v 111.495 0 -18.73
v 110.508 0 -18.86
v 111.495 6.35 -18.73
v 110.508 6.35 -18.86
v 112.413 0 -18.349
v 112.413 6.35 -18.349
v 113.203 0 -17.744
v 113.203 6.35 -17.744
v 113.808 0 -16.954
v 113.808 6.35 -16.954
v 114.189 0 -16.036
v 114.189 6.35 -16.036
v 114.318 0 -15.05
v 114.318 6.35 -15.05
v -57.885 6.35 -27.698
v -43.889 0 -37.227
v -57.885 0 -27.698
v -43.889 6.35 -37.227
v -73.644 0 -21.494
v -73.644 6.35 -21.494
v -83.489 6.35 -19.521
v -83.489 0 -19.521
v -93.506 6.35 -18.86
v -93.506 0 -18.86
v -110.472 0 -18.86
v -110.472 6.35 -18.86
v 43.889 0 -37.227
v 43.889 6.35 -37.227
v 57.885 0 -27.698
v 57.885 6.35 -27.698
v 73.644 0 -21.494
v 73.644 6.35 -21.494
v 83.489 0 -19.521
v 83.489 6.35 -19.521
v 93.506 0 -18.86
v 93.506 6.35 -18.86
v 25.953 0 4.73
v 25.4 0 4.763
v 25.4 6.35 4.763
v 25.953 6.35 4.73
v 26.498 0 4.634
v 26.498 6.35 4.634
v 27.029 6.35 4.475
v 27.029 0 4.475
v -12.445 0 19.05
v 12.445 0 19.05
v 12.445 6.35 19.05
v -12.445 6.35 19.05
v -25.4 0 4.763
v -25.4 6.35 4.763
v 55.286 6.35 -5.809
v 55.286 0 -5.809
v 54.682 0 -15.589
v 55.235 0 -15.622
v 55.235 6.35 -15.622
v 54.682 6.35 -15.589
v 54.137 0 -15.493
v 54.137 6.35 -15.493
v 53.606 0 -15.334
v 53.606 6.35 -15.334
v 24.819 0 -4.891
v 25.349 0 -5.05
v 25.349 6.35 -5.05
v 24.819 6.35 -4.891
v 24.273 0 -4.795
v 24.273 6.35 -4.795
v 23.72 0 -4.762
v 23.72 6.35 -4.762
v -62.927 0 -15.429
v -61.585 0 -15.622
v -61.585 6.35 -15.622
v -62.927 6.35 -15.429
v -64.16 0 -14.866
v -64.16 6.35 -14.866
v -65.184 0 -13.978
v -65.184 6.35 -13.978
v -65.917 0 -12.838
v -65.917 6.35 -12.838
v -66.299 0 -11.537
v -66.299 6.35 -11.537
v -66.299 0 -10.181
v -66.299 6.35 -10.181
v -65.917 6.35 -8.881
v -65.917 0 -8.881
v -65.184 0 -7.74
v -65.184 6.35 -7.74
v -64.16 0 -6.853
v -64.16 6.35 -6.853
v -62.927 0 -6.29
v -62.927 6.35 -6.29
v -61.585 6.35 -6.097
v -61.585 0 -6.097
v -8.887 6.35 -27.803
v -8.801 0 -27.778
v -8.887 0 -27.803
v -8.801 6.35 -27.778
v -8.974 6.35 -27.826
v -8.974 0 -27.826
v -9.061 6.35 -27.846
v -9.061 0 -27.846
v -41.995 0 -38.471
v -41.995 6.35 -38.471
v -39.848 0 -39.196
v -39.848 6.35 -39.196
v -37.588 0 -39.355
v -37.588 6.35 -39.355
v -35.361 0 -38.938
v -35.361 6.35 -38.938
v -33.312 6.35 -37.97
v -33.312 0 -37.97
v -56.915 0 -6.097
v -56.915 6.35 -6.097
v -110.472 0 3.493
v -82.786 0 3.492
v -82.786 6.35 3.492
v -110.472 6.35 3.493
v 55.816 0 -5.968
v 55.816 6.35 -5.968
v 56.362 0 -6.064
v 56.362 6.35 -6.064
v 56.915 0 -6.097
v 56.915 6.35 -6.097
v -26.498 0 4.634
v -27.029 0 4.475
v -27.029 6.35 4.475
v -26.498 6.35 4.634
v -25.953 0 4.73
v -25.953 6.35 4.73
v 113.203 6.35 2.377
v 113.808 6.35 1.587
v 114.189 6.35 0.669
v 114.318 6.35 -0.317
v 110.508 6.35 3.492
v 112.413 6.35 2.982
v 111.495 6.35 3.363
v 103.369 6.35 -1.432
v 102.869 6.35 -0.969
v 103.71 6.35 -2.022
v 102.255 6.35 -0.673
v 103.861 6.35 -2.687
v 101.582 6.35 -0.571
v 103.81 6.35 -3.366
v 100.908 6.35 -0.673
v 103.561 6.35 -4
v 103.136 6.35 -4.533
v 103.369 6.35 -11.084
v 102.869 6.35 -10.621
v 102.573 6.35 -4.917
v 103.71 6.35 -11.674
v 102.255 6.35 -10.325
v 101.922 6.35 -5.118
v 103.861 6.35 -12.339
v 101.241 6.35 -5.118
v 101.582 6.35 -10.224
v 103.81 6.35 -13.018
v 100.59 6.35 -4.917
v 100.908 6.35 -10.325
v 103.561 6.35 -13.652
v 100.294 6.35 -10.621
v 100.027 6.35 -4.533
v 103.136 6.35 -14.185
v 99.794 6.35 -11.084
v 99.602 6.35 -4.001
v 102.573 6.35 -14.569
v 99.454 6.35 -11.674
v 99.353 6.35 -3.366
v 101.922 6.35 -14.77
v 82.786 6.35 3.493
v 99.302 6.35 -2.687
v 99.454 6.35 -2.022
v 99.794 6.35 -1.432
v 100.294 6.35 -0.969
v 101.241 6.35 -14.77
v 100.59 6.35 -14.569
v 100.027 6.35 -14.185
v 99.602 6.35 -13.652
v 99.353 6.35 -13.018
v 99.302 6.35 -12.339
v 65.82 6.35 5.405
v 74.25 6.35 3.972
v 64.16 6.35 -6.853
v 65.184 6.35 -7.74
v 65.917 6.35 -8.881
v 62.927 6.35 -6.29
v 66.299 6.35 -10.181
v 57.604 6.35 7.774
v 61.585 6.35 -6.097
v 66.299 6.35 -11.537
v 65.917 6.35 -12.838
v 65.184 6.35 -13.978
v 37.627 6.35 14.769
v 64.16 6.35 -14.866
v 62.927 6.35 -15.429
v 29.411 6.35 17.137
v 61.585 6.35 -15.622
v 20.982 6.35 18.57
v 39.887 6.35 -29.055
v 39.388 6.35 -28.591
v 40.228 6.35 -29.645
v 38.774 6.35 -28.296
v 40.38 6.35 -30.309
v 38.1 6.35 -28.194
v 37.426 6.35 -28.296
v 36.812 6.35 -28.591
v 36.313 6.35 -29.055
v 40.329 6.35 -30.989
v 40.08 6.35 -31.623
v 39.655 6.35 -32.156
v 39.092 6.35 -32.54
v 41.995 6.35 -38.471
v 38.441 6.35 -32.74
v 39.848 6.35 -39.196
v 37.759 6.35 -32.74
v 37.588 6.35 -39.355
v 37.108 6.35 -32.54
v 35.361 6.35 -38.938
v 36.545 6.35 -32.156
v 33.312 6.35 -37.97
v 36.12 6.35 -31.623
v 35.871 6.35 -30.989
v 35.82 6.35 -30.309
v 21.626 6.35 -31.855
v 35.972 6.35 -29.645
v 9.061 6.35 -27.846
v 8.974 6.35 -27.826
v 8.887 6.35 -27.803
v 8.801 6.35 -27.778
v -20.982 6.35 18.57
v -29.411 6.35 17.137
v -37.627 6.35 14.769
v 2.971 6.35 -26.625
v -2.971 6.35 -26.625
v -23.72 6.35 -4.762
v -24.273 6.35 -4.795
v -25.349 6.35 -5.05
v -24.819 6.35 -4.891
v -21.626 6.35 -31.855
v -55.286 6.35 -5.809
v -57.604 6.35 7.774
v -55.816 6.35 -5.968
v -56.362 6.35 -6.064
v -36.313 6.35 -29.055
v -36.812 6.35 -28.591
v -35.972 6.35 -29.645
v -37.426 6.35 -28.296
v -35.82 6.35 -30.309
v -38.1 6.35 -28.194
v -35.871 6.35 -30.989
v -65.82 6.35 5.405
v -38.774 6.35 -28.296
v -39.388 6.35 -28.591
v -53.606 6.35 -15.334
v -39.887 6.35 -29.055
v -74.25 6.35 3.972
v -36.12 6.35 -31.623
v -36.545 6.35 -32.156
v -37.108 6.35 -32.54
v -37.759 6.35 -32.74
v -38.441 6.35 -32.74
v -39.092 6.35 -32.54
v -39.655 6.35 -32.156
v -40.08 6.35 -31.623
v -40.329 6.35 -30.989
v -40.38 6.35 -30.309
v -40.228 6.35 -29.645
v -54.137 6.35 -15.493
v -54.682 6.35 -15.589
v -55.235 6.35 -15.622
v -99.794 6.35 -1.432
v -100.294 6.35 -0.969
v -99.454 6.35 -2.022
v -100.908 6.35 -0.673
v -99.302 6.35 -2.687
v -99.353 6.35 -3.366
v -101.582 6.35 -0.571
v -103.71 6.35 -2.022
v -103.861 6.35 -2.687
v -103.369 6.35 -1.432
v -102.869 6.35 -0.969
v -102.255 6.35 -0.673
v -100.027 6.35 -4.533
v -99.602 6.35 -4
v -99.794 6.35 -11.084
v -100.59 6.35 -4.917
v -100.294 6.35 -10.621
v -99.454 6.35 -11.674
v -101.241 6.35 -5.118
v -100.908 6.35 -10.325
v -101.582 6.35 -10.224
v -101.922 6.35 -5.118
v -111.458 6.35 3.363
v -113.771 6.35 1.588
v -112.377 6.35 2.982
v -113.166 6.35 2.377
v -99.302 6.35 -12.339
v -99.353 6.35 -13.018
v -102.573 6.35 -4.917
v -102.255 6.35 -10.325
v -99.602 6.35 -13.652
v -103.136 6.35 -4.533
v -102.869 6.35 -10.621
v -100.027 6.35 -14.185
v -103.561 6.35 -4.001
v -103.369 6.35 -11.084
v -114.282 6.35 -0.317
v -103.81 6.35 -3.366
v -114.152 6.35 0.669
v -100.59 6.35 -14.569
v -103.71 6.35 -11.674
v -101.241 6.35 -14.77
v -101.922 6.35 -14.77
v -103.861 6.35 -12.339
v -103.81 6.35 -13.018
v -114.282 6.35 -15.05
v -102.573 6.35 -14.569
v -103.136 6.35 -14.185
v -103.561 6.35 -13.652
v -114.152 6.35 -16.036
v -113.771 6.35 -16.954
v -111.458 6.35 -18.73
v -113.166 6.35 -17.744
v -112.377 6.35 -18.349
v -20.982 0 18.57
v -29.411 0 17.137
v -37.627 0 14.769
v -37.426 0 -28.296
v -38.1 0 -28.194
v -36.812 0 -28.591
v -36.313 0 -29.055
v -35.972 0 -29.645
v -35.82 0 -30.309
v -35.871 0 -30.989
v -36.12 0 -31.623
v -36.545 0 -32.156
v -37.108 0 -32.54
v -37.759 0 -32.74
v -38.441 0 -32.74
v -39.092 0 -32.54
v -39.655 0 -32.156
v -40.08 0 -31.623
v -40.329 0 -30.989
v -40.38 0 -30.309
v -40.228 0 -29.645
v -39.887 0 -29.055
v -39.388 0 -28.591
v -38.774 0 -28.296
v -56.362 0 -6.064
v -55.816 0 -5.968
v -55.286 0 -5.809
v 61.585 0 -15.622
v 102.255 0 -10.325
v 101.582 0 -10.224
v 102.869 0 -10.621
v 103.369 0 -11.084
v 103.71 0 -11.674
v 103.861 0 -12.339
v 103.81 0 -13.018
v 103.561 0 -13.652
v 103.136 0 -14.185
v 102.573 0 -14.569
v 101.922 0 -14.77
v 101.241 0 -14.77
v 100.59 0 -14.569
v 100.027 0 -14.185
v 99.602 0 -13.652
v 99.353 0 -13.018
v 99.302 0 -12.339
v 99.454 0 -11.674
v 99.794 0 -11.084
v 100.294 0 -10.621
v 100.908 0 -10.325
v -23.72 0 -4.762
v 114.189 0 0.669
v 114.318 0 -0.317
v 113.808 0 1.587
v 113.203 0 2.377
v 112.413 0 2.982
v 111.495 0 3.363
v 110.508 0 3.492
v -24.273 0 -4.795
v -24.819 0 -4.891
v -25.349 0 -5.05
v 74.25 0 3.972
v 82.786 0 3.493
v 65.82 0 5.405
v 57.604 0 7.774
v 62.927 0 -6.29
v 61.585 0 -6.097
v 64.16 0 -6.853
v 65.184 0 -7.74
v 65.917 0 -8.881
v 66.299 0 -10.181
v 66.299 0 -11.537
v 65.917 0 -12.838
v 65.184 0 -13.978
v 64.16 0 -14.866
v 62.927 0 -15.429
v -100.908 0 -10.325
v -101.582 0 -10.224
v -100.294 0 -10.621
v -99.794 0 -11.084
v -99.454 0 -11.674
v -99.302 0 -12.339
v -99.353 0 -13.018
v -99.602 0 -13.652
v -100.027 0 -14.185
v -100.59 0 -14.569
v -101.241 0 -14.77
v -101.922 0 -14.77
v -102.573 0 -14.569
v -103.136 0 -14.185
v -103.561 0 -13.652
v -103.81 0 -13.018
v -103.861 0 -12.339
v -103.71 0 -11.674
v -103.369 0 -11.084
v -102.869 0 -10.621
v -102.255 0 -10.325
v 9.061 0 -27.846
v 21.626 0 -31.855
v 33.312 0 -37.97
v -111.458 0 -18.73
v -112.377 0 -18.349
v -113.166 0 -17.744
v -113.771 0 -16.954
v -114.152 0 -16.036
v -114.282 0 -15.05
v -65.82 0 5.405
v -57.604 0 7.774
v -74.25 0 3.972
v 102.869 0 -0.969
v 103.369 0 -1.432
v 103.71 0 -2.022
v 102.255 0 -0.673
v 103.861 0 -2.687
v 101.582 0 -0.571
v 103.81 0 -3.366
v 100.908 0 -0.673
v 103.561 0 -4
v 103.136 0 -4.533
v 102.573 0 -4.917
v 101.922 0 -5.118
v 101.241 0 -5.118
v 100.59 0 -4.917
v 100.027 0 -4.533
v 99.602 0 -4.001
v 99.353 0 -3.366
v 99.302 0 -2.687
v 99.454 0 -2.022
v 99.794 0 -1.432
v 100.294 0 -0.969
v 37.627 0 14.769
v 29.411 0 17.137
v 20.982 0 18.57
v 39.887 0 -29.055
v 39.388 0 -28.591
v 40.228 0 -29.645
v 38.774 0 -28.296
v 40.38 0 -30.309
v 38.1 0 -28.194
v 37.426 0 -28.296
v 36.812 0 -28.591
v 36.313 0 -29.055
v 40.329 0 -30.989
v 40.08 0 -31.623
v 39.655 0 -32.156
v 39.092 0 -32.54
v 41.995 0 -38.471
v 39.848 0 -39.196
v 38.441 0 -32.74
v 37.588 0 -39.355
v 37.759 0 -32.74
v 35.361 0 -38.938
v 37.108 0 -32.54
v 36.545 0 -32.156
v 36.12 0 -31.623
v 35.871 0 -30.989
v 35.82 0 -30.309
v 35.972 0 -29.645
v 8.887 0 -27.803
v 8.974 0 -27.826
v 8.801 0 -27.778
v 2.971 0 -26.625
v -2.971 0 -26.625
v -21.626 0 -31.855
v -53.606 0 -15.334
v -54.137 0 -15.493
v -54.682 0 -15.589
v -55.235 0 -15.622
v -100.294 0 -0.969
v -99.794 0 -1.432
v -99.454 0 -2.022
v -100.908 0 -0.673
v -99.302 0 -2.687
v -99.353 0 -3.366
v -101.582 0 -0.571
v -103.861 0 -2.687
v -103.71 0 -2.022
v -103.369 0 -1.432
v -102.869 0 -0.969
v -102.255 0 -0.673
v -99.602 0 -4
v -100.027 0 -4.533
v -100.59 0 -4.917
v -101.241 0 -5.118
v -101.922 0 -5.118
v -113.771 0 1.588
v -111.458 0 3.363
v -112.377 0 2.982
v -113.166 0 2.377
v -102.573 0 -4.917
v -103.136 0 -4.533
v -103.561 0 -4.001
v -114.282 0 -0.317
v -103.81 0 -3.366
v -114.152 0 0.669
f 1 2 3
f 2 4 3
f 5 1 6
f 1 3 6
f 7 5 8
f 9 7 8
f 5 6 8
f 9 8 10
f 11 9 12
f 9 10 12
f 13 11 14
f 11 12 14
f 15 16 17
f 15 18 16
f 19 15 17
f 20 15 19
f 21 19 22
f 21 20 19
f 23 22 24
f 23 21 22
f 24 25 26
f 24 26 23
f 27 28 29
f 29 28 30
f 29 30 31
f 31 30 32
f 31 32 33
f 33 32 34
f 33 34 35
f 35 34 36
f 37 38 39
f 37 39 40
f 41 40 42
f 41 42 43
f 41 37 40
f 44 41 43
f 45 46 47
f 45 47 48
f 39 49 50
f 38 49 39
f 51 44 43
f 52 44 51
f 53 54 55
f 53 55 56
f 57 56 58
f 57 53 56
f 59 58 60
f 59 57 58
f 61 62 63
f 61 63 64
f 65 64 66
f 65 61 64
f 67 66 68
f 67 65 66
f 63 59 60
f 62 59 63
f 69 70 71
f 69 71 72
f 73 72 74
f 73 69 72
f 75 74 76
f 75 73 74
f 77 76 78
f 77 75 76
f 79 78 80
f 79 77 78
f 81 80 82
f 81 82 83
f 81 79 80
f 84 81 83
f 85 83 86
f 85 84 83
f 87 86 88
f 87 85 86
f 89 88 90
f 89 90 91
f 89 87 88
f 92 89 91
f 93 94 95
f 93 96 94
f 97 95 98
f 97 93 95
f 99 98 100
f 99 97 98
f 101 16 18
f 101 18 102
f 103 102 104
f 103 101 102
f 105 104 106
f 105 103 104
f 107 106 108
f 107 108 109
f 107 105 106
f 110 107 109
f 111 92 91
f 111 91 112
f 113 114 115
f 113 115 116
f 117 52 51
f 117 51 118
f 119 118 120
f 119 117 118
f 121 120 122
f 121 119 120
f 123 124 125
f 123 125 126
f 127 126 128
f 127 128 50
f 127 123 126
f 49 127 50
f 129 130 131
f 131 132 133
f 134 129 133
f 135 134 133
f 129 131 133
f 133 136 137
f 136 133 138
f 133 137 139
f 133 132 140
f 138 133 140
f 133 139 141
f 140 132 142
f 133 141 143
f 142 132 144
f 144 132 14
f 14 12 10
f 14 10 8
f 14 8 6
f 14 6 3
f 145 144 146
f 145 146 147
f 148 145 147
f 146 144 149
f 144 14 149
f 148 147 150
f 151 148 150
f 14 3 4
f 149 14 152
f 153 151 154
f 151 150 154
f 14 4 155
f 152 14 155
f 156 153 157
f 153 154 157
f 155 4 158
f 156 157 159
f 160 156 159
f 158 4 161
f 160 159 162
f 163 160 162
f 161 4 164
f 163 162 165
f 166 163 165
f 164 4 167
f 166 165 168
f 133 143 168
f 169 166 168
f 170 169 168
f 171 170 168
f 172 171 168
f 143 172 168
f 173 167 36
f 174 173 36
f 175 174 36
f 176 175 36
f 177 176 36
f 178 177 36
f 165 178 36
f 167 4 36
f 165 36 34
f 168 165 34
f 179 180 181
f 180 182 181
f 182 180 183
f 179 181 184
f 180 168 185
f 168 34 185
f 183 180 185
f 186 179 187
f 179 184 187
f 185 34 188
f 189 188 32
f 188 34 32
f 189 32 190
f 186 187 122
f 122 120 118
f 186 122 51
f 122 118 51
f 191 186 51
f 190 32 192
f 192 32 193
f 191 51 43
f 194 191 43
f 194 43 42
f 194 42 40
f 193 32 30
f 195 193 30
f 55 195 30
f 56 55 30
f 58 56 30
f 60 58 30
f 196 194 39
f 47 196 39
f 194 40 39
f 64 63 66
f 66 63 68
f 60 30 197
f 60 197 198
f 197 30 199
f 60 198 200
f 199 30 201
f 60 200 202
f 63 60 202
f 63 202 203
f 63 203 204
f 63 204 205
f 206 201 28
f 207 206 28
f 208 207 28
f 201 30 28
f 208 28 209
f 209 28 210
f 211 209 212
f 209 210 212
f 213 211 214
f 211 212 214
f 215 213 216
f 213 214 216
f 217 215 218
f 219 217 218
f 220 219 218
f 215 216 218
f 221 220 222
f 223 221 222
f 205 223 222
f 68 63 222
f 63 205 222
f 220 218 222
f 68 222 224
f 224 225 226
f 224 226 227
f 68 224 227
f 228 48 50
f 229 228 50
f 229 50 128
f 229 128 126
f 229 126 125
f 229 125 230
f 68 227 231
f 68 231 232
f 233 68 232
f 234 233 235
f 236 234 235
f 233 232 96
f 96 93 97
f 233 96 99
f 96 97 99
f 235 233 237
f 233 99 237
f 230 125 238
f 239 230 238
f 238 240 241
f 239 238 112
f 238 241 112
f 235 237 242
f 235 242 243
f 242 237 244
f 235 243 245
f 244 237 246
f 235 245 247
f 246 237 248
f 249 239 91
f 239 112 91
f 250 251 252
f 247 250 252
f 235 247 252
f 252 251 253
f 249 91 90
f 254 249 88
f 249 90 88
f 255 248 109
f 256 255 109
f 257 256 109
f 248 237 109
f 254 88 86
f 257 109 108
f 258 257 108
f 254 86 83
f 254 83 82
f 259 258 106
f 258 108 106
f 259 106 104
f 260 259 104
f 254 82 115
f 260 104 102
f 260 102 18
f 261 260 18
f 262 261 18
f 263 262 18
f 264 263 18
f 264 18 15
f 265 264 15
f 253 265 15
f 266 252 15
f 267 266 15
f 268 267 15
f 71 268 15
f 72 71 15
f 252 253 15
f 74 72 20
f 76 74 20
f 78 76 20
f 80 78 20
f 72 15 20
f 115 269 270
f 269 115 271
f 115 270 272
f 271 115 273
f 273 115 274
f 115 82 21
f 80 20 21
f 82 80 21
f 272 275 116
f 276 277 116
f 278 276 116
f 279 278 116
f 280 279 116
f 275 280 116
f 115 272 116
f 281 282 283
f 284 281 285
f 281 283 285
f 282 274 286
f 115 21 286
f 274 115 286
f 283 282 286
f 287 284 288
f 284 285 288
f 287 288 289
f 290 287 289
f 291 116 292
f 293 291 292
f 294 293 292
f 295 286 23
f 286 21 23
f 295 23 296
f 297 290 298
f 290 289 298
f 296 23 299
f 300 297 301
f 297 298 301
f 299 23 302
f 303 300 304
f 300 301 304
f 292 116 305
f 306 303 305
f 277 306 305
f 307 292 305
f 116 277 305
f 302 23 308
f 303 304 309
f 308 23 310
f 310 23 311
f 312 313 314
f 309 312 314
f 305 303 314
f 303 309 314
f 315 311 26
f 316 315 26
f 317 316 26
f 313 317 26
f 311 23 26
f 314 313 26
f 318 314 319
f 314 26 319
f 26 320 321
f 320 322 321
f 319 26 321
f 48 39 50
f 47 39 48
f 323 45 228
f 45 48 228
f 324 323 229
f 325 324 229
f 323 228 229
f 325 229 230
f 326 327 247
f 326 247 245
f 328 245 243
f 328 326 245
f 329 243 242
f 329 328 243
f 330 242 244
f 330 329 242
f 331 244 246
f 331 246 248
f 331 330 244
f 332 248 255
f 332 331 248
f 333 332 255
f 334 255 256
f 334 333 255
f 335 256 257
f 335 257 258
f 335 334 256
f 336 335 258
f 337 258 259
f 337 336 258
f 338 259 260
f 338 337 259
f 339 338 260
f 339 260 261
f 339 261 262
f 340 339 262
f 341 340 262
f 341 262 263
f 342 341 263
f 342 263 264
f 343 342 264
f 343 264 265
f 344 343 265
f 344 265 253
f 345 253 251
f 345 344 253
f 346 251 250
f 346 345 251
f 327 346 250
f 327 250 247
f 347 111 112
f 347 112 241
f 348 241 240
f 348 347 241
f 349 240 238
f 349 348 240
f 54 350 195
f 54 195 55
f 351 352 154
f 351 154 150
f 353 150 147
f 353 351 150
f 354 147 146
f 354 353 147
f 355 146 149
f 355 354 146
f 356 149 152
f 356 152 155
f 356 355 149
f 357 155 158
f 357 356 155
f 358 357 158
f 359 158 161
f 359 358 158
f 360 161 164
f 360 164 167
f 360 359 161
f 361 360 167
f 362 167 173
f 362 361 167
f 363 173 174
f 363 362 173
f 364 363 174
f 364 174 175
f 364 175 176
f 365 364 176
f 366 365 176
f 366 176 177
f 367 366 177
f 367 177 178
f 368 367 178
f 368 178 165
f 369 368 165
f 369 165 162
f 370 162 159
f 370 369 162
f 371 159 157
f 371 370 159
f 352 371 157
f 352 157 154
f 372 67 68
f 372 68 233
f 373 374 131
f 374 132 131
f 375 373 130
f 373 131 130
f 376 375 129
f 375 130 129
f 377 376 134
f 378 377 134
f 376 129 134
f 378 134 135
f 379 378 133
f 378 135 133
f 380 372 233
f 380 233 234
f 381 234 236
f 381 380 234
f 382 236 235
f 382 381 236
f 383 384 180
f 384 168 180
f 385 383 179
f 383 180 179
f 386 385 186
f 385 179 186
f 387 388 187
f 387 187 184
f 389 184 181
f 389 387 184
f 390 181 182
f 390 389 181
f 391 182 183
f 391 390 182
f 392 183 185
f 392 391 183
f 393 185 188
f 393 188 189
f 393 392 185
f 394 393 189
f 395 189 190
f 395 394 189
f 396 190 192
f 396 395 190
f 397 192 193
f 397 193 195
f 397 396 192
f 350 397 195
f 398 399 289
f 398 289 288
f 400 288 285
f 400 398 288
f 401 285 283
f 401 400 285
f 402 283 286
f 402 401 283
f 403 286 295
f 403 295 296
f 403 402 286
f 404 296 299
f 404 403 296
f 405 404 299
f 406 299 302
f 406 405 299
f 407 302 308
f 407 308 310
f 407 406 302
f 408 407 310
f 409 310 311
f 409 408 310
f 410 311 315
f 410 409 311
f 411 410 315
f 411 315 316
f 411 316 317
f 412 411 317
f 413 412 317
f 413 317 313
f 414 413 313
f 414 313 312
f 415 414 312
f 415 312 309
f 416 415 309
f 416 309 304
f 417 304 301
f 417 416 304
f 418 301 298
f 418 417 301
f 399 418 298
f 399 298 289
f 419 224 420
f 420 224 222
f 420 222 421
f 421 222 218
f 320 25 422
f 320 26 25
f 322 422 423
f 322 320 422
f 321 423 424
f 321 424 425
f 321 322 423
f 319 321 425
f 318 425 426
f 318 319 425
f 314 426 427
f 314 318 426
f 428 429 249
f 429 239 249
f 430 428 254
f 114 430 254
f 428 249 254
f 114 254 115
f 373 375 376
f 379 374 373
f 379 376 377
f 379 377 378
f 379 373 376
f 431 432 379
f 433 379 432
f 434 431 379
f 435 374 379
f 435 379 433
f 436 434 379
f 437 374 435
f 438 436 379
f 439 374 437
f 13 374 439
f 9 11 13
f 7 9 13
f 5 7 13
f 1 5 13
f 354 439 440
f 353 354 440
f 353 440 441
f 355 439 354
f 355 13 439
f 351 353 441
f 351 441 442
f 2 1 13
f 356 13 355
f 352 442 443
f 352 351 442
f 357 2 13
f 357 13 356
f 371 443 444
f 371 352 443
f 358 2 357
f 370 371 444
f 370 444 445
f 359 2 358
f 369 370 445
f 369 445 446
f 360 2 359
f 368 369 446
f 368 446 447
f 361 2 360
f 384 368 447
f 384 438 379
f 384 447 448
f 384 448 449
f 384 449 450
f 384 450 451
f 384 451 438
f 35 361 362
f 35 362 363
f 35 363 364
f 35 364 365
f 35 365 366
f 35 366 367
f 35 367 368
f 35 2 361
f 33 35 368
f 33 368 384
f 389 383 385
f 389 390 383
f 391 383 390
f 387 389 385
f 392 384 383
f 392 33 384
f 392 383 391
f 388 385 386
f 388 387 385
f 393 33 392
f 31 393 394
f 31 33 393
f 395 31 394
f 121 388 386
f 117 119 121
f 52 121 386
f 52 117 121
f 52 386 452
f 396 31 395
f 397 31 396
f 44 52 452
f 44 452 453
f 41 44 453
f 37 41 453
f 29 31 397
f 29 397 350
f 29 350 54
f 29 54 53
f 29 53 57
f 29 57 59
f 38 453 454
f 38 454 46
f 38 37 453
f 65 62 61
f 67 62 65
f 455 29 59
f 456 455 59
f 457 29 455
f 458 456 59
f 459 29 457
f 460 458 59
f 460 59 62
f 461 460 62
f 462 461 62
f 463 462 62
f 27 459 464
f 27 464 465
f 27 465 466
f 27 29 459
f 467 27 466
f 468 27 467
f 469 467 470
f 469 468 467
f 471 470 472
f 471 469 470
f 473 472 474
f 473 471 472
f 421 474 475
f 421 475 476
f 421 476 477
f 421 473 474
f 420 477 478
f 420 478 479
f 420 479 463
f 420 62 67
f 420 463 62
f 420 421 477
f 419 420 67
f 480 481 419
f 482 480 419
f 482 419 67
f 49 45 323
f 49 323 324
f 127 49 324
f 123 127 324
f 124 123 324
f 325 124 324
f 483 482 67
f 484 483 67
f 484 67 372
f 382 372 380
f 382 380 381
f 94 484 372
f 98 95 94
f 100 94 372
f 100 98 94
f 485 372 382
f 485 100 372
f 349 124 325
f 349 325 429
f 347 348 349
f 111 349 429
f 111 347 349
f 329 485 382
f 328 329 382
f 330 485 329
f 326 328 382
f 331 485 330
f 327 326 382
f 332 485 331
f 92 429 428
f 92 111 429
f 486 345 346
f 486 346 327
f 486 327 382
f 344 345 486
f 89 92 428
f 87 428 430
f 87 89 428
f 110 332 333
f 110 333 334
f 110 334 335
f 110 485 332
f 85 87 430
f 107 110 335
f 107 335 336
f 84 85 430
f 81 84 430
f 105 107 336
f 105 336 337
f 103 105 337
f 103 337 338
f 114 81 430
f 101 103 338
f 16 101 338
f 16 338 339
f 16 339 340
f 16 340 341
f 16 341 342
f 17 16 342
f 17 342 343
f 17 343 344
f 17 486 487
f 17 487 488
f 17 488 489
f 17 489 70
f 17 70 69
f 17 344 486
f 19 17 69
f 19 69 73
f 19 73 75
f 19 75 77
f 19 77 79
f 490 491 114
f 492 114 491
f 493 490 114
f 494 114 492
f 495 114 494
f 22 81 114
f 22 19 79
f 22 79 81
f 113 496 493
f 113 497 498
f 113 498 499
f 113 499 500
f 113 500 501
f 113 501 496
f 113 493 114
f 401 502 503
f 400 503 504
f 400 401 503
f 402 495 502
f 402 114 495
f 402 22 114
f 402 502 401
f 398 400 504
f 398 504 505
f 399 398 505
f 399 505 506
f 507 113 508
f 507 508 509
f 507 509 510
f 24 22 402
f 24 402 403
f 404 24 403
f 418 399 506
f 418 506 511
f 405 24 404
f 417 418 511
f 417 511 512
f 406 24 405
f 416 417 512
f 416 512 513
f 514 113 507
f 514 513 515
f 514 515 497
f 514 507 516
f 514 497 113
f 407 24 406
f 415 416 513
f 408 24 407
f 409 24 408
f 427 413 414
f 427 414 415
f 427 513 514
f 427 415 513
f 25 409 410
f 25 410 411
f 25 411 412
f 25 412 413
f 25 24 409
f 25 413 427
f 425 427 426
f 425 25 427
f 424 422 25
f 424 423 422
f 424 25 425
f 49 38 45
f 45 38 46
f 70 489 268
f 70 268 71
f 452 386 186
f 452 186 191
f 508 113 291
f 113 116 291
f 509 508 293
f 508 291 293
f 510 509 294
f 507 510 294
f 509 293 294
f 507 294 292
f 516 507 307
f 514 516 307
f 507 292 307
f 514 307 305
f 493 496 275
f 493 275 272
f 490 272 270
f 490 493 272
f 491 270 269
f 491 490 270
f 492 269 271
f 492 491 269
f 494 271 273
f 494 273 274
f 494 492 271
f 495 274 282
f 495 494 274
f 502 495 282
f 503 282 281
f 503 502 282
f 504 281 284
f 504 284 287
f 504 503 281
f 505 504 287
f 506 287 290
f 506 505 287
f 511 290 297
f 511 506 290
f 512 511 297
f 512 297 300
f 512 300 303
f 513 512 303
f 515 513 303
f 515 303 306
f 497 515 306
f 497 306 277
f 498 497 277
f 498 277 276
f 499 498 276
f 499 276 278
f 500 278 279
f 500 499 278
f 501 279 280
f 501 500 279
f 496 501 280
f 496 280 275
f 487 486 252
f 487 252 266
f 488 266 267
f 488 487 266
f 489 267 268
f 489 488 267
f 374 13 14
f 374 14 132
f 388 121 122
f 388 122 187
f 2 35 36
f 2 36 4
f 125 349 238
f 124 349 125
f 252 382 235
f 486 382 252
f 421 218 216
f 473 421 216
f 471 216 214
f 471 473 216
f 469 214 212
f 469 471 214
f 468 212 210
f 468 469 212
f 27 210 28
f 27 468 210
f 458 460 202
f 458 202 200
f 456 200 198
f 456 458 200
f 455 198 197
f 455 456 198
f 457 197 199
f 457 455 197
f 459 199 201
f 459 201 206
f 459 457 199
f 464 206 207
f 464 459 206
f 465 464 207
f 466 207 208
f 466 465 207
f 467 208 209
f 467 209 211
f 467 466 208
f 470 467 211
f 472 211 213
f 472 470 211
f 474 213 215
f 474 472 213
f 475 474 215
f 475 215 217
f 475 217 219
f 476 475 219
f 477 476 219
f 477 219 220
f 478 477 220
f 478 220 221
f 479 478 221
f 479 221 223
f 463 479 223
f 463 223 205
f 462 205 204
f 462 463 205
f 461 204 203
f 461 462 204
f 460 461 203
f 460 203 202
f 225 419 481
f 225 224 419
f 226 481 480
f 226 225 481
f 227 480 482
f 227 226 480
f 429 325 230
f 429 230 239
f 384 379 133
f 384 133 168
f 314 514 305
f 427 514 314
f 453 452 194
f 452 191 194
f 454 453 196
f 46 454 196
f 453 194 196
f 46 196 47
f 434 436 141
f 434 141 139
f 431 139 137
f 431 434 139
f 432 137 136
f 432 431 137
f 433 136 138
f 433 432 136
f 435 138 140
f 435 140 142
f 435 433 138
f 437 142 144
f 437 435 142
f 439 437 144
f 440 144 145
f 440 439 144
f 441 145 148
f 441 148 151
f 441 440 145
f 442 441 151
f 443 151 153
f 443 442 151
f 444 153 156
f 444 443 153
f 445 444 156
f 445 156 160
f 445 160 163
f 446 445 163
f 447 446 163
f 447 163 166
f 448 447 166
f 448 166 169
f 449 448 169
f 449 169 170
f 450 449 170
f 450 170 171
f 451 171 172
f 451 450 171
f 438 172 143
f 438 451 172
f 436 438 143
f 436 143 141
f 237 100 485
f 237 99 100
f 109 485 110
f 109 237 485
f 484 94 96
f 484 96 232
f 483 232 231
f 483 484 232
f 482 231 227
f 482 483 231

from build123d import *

# Parameters (mm, degrees)
SKETCH1_R           = 2.286
BOSS_EXTRUDE1_DEPTH = 6.35
FILLET2_R           = 3.81
FILLET3_R           = 76.2


with BuildPart() as part:
    # Sketch1 → Boss-Extrude1 (new body)
    with BuildSketch(Plane(origin=(0, 0, 0), x_dir=(1, 0, 0), z_dir=(0, 1, 0))):
        with BuildLine():
            ThreePointArc((29.21, 30.48), (38.1, 39.37), (46.99, 30.48))
            Line((46.99, 30.48), (46.99, 18.8595))
            Line((46.99, 18.8595), (114.318469952, 18.8595))
            Line((114.318469952, 18.8595), (114.318469952, -3.4925))
            Line((114.318469952, -3.4925), (69.831530048, -3.4925))
            Line((69.831530048, -3.4925), (25.4, -19.05))
            Line((25.4, -19.05), (-25.4, -19.05))
            Line((-25.4, -19.05), (-69.831530048, -3.4925))
            Line((-69.831530048, -3.4925), (-114.281530048, -3.4925))
            Line((-114.281530048, -3.4925), (-114.281530048, 18.8595))
            Line((-114.281530048, 18.8595), (-46.99, 18.8595))
            Line((-46.99, 18.8595), (-46.99, 30.48))
            ThreePointArc((-46.99, 30.48), (-38.1, 39.37), (-29.21, 30.48))
            Line((-29.21, 30.48), (-29.21, 27.94))
            Line((-29.21, 27.94), (-9.321964372, 27.94))
            ThreePointArc((-9.321964372, 27.94), (0, 26.4795), (9.321964372, 27.94))
            Line((9.321964372, 27.94), (29.21, 27.94))
            Line((29.21, 27.94), (29.21, 30.48))
        make_face()
        with Locations(Location((101.581530048, 2.8575, 0), (0, 0, 270))):
            Circle(SKETCH1_R, mode=Mode.SUBTRACT)
        with Locations(Location((-101.581530048, 12.5095, 0), (0, 0, 270))):
            Circle(SKETCH1_R, mode=Mode.SUBTRACT)
        with Locations(Location((-101.581530048, 2.8575, 0), (0, 0, 270))):
            Circle(SKETCH1_R, mode=Mode.SUBTRACT)
        with Locations(Location((101.581530048, 12.5095, 0), (0, 0, 270))):
            Circle(SKETCH1_R, mode=Mode.SUBTRACT)
        with Locations(Location((-38.1, 30.48, 0), (0, 0, 270))):
            Circle(SKETCH1_R, mode=Mode.SUBTRACT)
        with Locations(Location((38.1, 30.48, 0), (0, 0, 270))):
            Circle(SKETCH1_R, mode=Mode.SUBTRACT)
        with BuildLine():
            Line((27.028870933, -4.475286106), (55.285884269, 5.809425657))
            ThreePointArc((55.285884269, 5.809425657), (56.087755755, 6.024286474), (56.914755201, 6.096639551))
            Line((56.914755201, 6.096639551), (61.58524071, 6.096639551))
            ThreePointArc((61.58524071, 6.096639551), (66.34774071, 10.859139551), (61.58524071, 15.621639551))
            Line((61.58524071, 15.621639551), (55.23524071, 15.621639551))
            ThreePointArc((55.23524071, 15.621639551), (54.408241264, 15.549286474), (53.606369777, 15.334425657))
            Line((53.606369777, 15.334425657), (25.349356441, 5.049713894))
            ThreePointArc((25.349356441, 5.049713894), (24.547484955, 4.834853076), (23.720485509, 4.7625))
            Line((23.720485509, 4.7625), (-23.720485509, 4.7625))
            ThreePointArc((-23.720485509, 4.7625), (-24.547484955, 4.834853076), (-25.349356441, 5.049713894))
            Line((-25.349356441, 5.049713894), (-53.606369777, 15.334425657))
            ThreePointArc((-53.606369777, 15.334425657), (-54.408241264, 15.549286474), (-55.23524071, 15.621639551))
            Line((-55.23524071, 15.621639551), (-61.58524071, 15.621639551))
            ThreePointArc((-61.58524071, 15.621639551), (-66.34774071, 10.859139551), (-61.58524071, 6.096639551))
            Line((-61.58524071, 6.096639551), (-56.914755201, 6.096639551))
            ThreePointArc((-56.914755201, 6.096639551), (-56.087755755, 6.024286474), (-55.285884269, 5.809425657))
            Line((-55.285884269, 5.809425657), (-27.028870933, -4.475286106))
            ThreePointArc((-27.028870933, -4.475286106), (-26.226999446, -4.690146924), (-25.4, -4.7625))
            Line((-25.4, -4.7625), (25.4, -4.7625))
            ThreePointArc((25.4, -4.7625), (26.226999446, -4.690146924), (27.028870933, -4.475286106))
        make_face(mode=Mode.SUBTRACT)
    extrude(amount=BOSS_EXTRUDE1_DEPTH)

    # Fillet2
    fillet2_edges = [part.edges().sort_by_distance(p)[0] for p in [
        (114.318469952, 3.175, -18.8595),
        (114.318469952, 3.175, 3.4925),
        (-114.281530048, 3.175, 3.4925),
        (-114.281530048, 3.175, -18.8595),
        (-9.321964372, 3.175, -27.94),
        (9.321964372, 3.175, -27.94),
    ]]
    fillet(fillet2_edges, radius=FILLET2_R)

    # Fillet3
    fillet3_edges = [part.edges().sort_by_distance(p)[0] for p in [
        (-46.99, 3.175, -18.8595),
        (-29.21, 3.175, -27.94),
        (29.21, 3.175, -27.94),
        (46.99, 3.175, -18.8595),
        (69.831530048, 3.175, 3.4925),
        (25.4, 3.175, 19.05),
        (-25.4, 3.175, 19.05),
        (-69.831530048, 3.175, 3.4925),
    ]]
    fillet(fillet3_edges, radius=FILLET3_R)


solid = part.part
